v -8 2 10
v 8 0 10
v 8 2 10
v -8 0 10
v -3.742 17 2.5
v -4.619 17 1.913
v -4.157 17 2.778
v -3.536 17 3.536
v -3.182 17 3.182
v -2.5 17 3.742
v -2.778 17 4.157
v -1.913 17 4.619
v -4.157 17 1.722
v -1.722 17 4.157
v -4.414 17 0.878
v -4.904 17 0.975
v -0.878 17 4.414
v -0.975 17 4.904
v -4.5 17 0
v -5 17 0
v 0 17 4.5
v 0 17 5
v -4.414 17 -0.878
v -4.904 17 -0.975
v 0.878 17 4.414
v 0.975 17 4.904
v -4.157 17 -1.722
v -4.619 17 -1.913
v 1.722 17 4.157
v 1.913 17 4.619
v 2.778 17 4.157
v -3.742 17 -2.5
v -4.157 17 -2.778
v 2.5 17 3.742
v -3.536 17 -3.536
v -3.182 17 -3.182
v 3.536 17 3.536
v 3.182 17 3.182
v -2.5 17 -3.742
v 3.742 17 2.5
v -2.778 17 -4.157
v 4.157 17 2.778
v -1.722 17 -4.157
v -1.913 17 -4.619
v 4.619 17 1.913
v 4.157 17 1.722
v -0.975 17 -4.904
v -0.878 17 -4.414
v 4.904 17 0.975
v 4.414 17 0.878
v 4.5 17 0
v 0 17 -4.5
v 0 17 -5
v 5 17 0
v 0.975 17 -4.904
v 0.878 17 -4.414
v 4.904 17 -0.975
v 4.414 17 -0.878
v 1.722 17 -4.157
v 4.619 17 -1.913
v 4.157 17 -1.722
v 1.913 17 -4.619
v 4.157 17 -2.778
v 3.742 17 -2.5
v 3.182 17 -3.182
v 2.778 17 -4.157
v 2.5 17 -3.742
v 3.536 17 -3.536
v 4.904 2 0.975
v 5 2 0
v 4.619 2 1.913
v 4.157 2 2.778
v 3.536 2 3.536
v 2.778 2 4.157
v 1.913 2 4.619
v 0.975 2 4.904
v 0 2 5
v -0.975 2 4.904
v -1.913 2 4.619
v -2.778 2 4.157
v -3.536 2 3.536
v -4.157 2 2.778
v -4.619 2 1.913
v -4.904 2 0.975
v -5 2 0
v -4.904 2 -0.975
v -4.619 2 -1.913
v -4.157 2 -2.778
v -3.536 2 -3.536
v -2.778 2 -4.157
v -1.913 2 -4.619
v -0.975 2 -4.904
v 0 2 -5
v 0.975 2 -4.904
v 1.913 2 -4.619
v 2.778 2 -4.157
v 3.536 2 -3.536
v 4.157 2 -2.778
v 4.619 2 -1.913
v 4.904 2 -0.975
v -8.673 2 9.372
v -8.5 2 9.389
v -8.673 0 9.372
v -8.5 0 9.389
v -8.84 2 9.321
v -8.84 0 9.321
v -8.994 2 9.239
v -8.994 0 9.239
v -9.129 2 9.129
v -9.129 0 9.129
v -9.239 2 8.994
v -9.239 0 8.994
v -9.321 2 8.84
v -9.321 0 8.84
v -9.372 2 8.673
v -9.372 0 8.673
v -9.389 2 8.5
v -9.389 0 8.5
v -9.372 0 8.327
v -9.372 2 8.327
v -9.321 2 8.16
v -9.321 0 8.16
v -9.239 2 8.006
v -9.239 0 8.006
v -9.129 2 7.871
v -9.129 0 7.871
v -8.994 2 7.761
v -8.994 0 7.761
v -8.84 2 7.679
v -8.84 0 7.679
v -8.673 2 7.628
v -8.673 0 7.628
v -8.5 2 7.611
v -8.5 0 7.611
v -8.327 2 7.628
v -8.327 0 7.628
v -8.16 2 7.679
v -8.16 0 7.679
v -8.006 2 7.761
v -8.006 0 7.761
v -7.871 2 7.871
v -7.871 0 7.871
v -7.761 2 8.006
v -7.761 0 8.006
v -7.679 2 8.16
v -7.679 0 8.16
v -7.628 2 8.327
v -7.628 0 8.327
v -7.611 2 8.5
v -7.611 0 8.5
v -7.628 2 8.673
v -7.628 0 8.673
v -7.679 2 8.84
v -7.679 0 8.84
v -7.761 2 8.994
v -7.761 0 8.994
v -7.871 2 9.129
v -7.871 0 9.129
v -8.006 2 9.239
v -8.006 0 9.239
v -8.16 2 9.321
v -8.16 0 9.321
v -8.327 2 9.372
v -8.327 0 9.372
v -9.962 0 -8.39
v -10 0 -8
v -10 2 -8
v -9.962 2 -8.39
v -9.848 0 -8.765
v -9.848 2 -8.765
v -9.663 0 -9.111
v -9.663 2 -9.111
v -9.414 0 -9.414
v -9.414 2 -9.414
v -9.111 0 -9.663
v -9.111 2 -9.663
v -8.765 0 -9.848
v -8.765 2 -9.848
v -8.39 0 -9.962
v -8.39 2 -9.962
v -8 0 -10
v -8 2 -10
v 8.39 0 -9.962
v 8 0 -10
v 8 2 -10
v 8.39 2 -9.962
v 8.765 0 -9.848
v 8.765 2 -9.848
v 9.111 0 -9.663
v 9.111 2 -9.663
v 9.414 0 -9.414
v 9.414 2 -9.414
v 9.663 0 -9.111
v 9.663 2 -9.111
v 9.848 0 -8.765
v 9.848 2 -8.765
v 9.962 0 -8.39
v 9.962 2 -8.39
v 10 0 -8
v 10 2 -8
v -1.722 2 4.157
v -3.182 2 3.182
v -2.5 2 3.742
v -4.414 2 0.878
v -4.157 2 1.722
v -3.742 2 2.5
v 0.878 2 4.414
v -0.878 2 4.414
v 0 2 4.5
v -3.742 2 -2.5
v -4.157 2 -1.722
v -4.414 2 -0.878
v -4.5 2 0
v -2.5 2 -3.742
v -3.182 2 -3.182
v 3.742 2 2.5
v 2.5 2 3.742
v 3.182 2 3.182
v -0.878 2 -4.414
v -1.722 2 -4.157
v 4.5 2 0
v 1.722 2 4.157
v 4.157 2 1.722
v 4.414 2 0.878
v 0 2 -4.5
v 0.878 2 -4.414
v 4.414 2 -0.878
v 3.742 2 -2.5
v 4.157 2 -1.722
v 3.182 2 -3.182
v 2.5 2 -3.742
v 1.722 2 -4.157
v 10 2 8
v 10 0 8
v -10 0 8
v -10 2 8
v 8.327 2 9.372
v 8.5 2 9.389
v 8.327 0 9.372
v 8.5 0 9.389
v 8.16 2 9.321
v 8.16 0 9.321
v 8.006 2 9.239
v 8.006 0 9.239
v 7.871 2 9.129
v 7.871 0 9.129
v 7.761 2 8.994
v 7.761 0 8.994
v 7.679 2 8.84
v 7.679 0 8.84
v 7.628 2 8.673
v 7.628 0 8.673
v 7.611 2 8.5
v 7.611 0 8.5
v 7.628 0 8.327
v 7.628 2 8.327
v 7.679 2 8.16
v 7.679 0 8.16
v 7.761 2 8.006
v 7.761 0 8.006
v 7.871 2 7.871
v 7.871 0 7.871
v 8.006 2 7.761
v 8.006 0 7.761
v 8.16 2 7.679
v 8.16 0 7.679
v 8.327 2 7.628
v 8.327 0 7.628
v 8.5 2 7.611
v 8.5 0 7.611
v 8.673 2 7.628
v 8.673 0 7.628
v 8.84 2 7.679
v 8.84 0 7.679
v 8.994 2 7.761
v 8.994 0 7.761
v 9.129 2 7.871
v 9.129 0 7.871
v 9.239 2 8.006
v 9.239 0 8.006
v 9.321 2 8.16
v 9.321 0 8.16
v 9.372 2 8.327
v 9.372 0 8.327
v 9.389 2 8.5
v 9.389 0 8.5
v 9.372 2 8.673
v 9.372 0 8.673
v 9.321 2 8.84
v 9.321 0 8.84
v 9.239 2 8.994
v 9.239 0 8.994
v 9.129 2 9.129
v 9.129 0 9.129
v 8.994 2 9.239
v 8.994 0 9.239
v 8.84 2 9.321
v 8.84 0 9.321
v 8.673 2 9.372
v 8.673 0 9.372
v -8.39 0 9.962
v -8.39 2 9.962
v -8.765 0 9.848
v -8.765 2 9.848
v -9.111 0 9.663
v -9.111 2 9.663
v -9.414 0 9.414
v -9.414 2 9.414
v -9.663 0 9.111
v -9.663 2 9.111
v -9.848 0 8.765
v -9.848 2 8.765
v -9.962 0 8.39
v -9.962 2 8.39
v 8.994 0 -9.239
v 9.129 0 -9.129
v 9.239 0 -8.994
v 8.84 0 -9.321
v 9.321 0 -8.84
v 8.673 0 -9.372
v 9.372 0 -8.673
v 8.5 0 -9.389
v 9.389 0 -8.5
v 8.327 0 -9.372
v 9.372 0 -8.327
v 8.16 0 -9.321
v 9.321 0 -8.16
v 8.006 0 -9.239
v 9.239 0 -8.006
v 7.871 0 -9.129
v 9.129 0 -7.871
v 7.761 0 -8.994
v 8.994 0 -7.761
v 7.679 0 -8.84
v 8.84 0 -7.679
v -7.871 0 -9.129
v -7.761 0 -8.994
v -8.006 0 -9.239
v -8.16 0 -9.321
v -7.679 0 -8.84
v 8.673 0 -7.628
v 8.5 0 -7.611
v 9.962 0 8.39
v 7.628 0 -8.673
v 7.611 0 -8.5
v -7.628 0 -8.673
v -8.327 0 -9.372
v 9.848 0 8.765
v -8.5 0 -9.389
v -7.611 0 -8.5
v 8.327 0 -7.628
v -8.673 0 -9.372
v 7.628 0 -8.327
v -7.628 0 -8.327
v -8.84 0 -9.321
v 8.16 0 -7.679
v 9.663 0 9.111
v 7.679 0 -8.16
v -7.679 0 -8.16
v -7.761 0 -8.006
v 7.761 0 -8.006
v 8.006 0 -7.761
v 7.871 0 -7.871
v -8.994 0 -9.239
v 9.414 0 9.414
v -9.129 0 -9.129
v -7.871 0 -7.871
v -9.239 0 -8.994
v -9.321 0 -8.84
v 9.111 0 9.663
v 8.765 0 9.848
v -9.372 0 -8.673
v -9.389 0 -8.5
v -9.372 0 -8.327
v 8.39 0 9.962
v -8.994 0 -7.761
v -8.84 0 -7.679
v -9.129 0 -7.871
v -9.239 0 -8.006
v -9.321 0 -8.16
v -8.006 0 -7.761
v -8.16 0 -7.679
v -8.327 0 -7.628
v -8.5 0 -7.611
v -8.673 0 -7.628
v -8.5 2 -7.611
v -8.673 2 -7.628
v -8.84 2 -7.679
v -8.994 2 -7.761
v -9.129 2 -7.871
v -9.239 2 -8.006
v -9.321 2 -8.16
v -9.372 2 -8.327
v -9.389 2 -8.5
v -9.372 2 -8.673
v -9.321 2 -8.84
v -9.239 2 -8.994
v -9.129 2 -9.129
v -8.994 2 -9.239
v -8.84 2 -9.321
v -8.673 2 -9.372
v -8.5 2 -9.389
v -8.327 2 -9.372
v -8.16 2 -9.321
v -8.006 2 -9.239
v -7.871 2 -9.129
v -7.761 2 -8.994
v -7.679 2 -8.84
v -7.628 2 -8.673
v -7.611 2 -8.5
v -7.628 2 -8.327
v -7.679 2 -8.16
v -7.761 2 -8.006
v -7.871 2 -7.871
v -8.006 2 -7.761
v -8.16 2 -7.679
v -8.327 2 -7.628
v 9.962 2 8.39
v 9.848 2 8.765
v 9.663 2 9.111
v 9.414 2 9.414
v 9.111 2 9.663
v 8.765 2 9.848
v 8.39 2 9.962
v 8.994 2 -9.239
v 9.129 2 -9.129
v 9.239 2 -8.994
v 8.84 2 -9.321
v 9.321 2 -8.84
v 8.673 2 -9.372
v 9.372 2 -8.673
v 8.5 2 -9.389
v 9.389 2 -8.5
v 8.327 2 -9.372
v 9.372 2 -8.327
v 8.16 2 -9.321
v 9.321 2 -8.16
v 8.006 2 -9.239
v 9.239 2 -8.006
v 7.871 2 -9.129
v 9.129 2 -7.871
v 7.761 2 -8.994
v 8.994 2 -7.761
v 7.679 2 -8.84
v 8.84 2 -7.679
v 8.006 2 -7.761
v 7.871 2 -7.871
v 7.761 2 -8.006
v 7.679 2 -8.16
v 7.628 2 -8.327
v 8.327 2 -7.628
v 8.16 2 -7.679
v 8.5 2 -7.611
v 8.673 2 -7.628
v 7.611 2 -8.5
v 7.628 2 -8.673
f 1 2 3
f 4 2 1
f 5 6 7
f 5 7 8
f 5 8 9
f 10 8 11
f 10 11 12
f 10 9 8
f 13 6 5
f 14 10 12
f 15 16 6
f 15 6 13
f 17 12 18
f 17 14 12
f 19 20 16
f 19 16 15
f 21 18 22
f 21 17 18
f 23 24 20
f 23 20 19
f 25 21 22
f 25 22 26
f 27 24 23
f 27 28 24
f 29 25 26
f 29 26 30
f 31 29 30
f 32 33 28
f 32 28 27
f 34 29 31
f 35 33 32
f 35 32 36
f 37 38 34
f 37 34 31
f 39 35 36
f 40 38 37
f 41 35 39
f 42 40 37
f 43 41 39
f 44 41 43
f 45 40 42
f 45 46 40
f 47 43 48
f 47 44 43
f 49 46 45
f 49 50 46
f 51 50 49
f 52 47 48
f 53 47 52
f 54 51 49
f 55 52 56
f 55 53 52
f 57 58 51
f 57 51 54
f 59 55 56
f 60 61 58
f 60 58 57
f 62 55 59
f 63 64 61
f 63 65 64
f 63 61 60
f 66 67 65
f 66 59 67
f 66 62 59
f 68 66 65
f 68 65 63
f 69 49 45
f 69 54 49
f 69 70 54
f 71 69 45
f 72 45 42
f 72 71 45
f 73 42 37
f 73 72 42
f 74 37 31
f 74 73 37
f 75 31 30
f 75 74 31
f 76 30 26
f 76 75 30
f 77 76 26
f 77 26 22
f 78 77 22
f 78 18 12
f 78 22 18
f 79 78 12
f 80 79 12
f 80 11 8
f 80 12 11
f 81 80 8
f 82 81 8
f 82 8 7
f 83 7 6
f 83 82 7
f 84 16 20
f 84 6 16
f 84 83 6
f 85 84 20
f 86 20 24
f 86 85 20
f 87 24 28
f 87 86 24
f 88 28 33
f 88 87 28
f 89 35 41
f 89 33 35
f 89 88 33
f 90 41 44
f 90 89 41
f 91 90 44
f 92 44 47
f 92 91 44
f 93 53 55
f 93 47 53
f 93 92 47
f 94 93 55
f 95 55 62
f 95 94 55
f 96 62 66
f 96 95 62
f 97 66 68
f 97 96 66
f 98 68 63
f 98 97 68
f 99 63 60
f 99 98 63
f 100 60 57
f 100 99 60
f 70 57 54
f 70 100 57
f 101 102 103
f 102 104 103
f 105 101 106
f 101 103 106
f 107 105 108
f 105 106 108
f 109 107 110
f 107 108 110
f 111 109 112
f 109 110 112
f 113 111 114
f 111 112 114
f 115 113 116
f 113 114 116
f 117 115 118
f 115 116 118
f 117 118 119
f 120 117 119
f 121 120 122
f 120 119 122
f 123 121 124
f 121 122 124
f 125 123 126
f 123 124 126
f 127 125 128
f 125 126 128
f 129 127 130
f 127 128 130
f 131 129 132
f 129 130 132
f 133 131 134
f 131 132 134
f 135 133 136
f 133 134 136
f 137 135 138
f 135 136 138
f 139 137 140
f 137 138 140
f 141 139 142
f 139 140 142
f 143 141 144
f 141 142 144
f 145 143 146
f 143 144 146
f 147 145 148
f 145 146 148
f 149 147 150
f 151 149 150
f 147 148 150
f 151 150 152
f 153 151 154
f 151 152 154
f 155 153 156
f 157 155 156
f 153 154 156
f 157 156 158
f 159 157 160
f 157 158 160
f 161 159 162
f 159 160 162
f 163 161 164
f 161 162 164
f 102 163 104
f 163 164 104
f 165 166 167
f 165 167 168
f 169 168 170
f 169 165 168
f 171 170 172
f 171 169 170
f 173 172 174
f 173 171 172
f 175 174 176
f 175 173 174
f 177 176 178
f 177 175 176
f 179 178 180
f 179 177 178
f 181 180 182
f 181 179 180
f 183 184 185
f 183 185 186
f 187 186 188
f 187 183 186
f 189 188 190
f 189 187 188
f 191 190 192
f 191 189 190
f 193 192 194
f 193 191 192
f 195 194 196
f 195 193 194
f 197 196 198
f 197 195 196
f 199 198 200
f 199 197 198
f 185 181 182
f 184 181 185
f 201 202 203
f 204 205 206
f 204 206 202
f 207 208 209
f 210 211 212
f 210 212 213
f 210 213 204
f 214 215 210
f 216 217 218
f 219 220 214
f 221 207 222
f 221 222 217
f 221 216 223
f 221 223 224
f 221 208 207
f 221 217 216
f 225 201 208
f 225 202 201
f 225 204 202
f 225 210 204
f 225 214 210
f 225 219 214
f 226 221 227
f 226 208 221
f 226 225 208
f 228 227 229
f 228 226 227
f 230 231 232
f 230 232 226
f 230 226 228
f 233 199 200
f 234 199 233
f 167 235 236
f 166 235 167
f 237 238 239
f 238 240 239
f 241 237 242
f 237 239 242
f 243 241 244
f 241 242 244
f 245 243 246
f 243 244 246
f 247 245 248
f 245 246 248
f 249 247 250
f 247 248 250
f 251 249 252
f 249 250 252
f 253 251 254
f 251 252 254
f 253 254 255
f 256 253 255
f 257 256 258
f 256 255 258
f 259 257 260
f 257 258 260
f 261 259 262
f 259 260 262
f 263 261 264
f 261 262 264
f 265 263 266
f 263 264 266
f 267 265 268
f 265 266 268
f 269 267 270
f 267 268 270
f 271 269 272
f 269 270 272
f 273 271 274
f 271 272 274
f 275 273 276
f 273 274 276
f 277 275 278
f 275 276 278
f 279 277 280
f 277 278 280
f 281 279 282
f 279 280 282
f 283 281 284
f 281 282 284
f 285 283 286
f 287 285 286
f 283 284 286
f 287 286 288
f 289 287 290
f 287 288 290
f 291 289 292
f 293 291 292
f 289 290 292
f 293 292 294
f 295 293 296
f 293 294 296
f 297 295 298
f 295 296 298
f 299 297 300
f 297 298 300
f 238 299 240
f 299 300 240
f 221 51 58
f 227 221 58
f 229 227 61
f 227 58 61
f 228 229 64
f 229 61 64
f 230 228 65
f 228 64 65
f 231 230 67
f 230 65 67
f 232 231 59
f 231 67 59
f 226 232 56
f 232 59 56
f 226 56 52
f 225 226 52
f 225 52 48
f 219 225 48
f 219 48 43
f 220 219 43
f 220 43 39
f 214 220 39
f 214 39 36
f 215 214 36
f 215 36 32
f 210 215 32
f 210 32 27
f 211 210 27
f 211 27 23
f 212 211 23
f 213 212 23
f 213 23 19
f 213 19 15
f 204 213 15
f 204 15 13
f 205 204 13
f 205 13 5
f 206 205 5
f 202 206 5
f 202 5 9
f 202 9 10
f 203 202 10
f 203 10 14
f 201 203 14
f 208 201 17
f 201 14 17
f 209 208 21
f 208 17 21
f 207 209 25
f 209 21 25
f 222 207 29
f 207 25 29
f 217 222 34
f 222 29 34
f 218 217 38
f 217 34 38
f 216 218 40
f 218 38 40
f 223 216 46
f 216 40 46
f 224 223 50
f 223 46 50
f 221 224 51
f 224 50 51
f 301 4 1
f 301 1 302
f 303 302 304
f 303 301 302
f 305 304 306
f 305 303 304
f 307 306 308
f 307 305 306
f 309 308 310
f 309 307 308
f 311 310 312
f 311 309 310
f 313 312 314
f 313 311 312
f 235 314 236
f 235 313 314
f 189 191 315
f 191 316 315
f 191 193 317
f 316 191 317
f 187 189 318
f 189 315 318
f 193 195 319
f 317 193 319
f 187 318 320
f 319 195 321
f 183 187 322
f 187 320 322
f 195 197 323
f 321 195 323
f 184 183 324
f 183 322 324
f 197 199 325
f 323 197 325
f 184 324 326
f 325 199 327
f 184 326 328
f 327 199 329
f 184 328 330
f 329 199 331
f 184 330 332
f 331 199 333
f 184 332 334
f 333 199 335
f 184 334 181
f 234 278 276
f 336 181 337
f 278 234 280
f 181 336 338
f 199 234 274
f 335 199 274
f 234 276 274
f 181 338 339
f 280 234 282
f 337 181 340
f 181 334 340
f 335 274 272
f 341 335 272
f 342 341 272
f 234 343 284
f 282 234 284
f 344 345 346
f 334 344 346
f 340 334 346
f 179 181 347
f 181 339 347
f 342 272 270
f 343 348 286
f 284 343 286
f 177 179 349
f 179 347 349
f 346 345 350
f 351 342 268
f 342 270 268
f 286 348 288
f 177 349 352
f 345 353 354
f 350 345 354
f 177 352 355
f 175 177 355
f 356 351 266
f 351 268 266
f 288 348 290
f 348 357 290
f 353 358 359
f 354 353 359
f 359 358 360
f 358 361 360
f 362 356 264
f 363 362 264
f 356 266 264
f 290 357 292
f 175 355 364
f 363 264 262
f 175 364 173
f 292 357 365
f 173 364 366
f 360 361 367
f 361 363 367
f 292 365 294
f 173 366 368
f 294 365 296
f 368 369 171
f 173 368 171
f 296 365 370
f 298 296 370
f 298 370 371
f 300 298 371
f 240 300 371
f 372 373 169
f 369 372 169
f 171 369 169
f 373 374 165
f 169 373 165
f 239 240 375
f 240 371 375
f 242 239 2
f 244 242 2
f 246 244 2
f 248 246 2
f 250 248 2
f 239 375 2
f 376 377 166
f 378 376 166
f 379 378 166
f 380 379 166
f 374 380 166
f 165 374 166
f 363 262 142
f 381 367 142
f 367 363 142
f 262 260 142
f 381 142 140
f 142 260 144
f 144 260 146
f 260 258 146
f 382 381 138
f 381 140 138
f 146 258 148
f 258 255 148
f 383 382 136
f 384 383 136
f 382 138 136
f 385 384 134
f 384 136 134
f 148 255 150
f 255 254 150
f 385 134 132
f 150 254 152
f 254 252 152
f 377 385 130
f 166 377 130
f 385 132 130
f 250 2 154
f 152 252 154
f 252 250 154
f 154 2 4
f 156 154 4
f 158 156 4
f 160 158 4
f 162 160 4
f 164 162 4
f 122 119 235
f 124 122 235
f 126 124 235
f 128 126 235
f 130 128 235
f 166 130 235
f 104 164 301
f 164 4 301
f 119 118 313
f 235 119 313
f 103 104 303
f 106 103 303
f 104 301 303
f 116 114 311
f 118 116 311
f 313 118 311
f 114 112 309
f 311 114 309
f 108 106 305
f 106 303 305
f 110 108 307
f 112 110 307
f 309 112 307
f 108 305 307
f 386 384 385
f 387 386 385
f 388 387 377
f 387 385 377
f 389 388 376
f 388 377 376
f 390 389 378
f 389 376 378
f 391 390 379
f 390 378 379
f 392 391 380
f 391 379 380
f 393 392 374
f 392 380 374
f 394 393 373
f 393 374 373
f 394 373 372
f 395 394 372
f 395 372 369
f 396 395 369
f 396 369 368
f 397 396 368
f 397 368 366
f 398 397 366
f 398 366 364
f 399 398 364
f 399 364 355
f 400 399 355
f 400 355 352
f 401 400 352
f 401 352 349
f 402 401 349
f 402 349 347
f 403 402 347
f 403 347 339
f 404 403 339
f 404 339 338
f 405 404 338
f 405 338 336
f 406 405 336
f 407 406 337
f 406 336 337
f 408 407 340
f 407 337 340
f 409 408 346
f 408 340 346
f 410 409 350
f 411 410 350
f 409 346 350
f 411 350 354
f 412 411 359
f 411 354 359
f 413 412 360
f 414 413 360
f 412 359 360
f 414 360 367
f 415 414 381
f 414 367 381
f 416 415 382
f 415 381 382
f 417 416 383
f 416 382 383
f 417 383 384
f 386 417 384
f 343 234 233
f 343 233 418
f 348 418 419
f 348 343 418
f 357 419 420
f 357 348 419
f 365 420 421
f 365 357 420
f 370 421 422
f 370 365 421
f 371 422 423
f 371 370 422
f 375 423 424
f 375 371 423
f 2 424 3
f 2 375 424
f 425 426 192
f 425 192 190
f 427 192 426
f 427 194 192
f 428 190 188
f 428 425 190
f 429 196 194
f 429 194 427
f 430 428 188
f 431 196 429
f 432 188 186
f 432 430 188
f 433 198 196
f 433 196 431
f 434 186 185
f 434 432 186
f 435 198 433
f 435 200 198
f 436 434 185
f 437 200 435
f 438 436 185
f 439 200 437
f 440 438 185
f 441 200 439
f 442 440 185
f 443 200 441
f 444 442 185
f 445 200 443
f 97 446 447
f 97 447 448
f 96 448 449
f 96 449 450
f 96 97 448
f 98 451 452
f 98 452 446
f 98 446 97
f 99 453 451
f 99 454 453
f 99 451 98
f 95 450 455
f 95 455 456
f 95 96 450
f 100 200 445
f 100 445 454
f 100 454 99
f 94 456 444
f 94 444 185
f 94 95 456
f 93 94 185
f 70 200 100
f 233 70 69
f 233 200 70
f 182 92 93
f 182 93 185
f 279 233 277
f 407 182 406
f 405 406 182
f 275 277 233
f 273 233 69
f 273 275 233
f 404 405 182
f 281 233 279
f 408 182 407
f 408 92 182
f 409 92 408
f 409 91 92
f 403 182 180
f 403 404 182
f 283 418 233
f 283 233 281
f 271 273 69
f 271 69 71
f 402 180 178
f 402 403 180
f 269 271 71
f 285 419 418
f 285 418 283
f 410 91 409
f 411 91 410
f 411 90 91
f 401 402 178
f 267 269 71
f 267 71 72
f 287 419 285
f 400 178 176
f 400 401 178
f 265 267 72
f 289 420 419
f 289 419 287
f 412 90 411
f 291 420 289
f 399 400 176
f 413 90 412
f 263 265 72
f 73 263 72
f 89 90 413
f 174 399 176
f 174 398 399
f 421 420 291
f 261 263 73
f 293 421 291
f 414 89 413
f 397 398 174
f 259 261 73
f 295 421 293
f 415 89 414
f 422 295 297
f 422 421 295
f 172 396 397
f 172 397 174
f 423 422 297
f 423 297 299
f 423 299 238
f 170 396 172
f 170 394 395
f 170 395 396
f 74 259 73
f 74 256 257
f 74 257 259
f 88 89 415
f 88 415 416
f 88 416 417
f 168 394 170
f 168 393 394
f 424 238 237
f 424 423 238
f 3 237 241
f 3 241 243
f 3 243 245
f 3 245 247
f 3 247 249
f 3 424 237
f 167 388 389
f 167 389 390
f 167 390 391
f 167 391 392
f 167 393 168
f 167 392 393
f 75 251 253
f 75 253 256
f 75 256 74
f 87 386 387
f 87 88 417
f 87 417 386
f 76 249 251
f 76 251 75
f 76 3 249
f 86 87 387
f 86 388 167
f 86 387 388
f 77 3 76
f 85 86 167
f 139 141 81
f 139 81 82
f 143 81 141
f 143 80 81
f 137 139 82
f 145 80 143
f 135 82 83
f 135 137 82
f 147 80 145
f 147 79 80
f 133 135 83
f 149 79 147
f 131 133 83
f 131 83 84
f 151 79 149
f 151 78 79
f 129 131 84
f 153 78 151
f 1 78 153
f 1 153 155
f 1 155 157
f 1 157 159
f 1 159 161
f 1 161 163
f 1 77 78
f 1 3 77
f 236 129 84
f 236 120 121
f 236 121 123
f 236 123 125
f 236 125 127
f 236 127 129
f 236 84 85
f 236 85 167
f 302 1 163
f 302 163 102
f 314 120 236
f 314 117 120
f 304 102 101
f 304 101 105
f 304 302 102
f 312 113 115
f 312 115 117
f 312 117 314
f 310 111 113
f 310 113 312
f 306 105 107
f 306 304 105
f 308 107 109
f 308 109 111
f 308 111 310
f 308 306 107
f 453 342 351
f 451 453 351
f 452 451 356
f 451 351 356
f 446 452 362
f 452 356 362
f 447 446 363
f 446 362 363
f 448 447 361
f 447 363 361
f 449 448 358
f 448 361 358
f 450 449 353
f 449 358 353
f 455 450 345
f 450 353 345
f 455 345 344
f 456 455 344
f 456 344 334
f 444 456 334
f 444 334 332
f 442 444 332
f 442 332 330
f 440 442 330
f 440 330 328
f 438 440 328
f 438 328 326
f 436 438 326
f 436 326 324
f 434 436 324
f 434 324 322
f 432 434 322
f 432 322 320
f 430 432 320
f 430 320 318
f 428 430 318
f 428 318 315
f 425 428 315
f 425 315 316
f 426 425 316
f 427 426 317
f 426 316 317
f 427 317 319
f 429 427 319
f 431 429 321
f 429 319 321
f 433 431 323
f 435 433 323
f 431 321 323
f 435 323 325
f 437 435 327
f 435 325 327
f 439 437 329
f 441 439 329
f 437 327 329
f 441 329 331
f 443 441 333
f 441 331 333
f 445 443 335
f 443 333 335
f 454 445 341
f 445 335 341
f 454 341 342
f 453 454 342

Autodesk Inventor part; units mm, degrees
ref_plane "YZ Plane" through (0, 0, 0) normal (1, 0, 0) x (0, 1, 0)
ref_plane "XZ Plane" through (0, 0, 0) normal (0, 1, 0) x (-1, 0, 0)
sketch "Sketch1" plane through (0, 0, 0) normal (0, 1, 0) x (-1, 0, 0)
  line L0 (-8, 10) -> (8, 10)
  line L1 (10, 8) -> (10, -8)
  line L2 (8, -10) -> (-8, -10)
  line L3 (-10, -8) -> (-10, 8)
  line L4 (-10, 10) -> (10, -10) construction
  line L5 (10, 10) -> (-10, -10) construction
  arc A0 (10, 8) -> (8, 10) centre (8, 8) ccw
  arc A1 (8, -10) -> (10, -8) centre (8, -8) ccw
  arc A2 (-8, 10) -> (-10, 8) centre (-8, 8) ccw
  arc A3 (-10, -8) -> (-8, -10) centre (-8, -8) ccw
  point P0 (0, 0)
  dimension "d0" = 20
  dimension "d1" = 20
  dimension "d34" = 2
  dimension "d35" = 2
  dimension "d36" = 2
  dimension "d37" = 2
extrude "Extrusion1" add sketch "Sketch1" along normal blind 2
sketch "Sketch2" plane through (0, 2, 0) normal (0, 1, 0) x (1, 0, 0)
  line L0 (8.5, -8.5) -> (-8.5, -8.5)
  line L1 (-8.5, -8.5) -> (-8.5, 8.5)
  line L2 (-8.5, 8.5) -> (8.5, 8.5)
  line L3 (8.5, 8.5) -> (8.5, -8.5)
  line L4 (8.5, -8.5) -> (-8.5, 8.5) construction
  line L5 (-8.5, -8.5) -> (8.5, 8.5) construction
  point P0 (0, 0)
  dimension "d4" = 17
  dimension "d5" = 17
hole "Hole1" at (-8.5, 2, 8.5) direction (0, -1, 0) diameter 1.778 end through all
hole "Hole2" at (8.5, 2, 8.5) direction (0, -1, 0) diameter 1.778 end through all
hole "Hole3" at (-8.5, 2, -8.5) direction (0, -1, 0) diameter 1.778 end through all
hole "Hole4" at (8.5, 2, -8.5) direction (0, -1, 0) diameter 1.778 end through all
sketch "Sketch3" plane through (0, 2, 0) normal (0, 1, 0) x (1, 0, 0)
  circle A0 centre (0, 0) radius 5
  dimension "d38" = 10
extrude "Extrusion2" add sketch "Sketch3" along normal blind 15 and the other way blind 1
sketch "Sketch4" plane through (0, 17, 0) normal (0, 1, 0) x (1, 0, 0)
  circle A0 centre (0, 0) radius 4.5
  dimension "d41" = 9
extrude "Extrusion3" cut sketch "Sketch4" against normal blind 15
sketch "Sketch12" plane through (0, 0, 0) normal (0, 0, 1) x (1, 0, 0)
  line L0 (-10, 0) -> (-10, 2) construction
  line L1 (-10, 2) -> (-5, 2) construction
  line L2 (-5, 2) -> (-5, 17) construction
  line L3 (-5, 17) -> (-4.5, 17) construction
  line L4 (-4.5, 17) -> (-4.5, 2) construction
  line L5 (-4.5, 2) -> (4.5, 2) construction
  line L6 (4.5, 2) -> (4.5, 17) construction
  line L7 (4.5, 17) -> (5, 17) construction
  line L8 (5, 17) -> (5, 2) construction
  line L9 (5, 2) -> (10, 2) construction
  line L10 (10, 2) -> (10, 0) construction
  line L11 (10, 0) -> (-10, 0) construction
  line L12 (-5, 17) -> (-8.8394, 7.1494)
  line L13 (-5, 2) -> (5, 2) projected
  line L14 (-8.8394, 7.1494) -> (-5, 2)
  point P0 (0, 0)
properties part number "mock"
